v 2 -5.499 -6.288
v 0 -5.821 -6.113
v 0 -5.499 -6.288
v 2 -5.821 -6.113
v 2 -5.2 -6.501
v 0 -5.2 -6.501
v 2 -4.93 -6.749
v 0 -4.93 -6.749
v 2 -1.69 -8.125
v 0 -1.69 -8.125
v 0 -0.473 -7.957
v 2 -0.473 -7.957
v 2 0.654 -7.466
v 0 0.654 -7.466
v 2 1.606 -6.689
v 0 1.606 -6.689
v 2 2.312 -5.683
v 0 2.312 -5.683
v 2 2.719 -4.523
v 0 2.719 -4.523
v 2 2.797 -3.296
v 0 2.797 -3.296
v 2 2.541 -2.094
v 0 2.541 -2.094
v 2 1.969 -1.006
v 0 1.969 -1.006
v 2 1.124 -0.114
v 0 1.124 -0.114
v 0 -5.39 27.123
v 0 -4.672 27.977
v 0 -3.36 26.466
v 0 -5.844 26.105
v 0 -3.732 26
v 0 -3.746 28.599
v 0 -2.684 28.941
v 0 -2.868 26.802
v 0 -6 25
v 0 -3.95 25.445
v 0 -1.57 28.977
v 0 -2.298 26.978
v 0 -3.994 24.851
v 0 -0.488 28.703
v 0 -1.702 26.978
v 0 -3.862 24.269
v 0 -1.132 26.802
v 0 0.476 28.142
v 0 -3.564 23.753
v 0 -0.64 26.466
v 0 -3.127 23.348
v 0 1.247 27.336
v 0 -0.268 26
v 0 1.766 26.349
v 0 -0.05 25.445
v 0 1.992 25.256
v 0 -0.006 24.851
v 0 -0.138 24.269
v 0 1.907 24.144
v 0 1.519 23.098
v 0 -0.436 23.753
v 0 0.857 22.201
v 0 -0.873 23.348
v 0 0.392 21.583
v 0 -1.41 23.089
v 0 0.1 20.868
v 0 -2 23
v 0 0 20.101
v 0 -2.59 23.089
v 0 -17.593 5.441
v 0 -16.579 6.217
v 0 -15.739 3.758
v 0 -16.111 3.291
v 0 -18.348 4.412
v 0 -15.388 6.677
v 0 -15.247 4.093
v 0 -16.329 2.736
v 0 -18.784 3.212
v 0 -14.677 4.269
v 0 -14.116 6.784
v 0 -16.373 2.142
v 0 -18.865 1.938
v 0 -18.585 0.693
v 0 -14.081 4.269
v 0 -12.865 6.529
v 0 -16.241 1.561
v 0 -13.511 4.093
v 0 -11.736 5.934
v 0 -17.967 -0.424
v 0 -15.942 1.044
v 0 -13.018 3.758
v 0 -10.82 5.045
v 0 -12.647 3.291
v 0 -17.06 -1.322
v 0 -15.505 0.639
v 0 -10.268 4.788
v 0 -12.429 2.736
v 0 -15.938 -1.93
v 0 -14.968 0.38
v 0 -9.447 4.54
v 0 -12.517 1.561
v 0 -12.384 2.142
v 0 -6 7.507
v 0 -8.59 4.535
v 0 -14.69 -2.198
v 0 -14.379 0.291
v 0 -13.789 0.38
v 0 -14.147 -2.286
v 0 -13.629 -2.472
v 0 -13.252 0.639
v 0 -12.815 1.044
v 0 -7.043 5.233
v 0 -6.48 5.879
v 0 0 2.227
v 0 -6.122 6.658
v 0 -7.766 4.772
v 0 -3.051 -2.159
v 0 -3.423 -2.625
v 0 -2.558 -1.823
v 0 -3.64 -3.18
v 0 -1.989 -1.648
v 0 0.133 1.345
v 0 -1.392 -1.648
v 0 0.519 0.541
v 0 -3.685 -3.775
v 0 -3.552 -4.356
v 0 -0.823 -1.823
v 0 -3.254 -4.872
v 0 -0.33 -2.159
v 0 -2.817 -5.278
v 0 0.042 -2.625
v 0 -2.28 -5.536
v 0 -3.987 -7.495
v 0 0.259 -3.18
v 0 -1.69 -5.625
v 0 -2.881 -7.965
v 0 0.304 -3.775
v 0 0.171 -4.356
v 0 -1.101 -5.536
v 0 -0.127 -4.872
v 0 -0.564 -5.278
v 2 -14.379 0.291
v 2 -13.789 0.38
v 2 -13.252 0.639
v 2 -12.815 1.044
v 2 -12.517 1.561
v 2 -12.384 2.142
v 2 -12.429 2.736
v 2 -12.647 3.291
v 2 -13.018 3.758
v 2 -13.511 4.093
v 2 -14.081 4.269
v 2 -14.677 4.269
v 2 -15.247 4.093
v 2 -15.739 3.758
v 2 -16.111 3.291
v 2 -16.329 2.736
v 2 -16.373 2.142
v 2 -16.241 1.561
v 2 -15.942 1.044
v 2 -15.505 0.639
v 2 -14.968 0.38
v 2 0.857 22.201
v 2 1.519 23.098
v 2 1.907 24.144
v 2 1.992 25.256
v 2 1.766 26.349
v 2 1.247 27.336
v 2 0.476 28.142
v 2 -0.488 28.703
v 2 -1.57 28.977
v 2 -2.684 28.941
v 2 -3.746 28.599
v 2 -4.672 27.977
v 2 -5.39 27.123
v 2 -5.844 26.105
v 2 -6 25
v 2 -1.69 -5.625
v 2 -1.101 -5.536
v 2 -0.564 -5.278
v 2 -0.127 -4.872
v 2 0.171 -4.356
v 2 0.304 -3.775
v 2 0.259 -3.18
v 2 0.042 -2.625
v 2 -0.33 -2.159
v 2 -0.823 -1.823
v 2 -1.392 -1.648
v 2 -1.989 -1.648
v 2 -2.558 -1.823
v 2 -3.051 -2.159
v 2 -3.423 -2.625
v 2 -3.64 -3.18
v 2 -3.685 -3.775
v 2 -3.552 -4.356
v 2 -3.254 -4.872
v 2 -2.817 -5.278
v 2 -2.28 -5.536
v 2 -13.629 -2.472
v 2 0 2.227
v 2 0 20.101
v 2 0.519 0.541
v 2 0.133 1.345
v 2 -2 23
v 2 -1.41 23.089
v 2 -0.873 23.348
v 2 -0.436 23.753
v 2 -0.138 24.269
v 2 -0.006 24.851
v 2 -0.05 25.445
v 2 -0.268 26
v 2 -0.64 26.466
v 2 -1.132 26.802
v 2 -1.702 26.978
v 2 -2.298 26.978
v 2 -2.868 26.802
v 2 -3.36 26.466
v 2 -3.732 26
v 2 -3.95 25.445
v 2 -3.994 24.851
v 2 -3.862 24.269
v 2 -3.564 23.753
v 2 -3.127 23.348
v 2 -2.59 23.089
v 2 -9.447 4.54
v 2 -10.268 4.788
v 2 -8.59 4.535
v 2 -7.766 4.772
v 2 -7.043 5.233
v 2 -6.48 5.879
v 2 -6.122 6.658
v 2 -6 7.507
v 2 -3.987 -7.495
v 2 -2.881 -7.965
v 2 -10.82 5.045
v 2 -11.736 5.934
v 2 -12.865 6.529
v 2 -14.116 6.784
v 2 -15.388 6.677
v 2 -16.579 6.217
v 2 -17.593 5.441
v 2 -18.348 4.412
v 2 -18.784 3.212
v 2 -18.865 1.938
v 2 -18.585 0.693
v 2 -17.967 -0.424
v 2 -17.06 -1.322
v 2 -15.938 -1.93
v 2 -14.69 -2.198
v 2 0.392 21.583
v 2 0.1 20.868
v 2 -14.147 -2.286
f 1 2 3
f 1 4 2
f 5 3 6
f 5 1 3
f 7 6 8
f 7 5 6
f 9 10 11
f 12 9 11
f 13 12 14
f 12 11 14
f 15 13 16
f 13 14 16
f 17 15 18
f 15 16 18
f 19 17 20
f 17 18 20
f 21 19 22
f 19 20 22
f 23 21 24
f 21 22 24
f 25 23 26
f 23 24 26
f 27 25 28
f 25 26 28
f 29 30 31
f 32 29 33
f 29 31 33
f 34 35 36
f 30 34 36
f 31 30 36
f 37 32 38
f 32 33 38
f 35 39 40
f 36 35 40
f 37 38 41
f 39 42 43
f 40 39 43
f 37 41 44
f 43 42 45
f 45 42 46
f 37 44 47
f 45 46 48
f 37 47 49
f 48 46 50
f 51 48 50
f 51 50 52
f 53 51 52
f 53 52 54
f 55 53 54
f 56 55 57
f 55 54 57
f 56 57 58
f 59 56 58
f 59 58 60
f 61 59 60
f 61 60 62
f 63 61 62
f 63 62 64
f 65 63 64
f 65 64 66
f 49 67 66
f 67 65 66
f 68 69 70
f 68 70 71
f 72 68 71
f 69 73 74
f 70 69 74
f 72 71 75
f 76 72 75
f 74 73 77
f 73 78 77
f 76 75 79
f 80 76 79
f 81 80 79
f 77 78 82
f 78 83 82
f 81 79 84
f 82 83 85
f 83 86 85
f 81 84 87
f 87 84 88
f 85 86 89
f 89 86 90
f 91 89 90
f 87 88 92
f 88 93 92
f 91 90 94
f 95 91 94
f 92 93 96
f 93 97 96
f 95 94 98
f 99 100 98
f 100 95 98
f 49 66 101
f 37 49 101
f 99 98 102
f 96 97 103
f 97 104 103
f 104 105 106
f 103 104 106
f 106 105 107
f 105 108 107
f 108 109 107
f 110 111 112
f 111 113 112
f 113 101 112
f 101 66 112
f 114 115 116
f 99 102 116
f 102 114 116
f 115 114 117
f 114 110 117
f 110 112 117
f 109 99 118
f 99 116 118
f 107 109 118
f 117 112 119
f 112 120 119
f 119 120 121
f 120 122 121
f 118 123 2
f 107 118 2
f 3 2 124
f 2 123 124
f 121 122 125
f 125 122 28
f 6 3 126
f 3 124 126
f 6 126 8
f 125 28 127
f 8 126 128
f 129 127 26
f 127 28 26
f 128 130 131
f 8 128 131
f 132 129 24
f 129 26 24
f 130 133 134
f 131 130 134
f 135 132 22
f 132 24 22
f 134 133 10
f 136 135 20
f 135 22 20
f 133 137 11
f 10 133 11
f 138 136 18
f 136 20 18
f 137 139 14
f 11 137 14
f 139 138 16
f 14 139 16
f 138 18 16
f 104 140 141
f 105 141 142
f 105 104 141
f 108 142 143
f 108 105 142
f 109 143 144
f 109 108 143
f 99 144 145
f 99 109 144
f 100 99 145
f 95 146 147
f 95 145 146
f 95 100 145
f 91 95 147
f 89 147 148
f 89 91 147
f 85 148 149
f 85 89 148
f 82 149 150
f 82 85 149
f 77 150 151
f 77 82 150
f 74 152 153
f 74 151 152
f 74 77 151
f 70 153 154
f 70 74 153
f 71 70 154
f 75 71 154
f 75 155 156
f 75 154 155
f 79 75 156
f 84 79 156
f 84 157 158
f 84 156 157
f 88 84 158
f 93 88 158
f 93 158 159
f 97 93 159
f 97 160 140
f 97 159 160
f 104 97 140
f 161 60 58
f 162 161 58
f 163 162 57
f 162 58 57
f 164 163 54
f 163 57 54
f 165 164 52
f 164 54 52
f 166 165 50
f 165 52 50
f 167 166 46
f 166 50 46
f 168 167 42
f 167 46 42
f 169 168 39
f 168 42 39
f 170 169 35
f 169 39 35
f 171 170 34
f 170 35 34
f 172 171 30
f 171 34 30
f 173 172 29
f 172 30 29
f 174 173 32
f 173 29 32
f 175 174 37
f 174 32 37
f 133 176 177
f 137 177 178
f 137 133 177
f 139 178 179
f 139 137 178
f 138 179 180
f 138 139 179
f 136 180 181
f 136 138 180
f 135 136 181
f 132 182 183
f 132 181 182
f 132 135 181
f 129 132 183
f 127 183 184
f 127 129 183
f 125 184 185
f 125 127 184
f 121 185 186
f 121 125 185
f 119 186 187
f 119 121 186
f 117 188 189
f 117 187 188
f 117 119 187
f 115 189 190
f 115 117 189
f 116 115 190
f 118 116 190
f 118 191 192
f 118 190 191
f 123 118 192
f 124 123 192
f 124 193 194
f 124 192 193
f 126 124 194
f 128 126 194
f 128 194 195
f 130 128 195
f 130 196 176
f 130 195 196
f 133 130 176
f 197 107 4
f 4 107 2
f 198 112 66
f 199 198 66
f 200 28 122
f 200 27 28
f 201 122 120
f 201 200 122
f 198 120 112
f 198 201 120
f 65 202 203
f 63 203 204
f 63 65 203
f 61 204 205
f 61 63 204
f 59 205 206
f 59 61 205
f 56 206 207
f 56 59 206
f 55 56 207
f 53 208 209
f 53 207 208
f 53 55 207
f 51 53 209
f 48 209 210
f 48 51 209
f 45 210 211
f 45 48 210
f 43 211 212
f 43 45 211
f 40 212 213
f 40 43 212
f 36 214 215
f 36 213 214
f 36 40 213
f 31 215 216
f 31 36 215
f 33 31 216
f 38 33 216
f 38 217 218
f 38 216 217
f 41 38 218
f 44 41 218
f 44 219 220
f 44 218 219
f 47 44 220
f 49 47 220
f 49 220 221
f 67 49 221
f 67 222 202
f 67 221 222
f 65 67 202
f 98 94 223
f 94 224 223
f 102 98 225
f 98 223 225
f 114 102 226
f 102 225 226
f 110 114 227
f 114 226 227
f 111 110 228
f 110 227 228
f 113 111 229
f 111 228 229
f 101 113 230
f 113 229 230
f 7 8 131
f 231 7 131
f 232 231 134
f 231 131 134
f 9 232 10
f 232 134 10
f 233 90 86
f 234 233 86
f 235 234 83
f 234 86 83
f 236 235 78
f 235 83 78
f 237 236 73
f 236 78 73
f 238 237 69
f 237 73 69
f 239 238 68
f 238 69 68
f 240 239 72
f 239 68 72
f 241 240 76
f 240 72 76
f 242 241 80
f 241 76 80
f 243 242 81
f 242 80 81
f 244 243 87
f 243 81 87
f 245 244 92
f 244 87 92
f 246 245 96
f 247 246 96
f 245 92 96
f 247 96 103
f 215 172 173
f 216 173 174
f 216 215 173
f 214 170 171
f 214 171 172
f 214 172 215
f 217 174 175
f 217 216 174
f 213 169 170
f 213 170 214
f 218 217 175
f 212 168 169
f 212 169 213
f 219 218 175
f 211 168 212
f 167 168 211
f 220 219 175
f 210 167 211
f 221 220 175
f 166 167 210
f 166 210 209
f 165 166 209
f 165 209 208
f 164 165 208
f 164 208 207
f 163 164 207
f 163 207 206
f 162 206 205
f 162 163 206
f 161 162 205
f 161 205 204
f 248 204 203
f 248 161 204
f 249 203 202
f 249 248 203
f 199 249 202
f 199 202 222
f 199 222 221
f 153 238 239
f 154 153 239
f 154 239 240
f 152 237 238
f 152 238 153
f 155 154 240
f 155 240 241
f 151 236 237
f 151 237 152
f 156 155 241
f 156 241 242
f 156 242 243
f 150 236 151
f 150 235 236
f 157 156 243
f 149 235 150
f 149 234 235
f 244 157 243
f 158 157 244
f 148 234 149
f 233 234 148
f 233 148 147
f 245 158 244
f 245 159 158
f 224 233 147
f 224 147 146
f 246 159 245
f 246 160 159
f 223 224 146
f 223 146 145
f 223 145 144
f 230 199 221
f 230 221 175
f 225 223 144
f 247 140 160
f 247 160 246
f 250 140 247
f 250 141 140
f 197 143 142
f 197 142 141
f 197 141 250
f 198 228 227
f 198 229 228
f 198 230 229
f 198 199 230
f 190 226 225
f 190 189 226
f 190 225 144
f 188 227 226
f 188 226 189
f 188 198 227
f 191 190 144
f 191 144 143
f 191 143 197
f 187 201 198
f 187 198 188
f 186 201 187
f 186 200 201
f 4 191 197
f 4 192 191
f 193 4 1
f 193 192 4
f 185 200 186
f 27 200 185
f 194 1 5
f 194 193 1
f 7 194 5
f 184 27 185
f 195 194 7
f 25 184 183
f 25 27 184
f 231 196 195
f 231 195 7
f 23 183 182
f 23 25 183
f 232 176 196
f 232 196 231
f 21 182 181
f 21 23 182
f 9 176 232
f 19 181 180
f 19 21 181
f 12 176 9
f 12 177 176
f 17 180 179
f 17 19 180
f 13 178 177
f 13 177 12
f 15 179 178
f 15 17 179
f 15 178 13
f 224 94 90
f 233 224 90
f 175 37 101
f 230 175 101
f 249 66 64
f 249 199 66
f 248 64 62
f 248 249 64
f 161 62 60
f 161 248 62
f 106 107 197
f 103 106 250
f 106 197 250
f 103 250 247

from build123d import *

# Parameters (mm, degrees)
EXTRUDE_1_DEPTH     = 2
SKETCH_1_3_R        = 2
CUT_EXTRUDE_1_DEPTH = 35.66133887
FILLET_1_R          = 3


with BuildPart() as part:
    # 草图1 → 凸台-拉伸1 (new body)
    with BuildSketch(Plane(origin=(0, 0, 0), x_dir=(0, 0, -1), z_dir=(1, 0, 0))):
        with BuildLine():
            Line((-25, -6), (-25, 0))
            Line((-25, 0), (-21.535898385, 0))
            ThreePointArc((-21.535898385, 0), (-28.464101615, 0), (-25, -6))
        make_face()
        with BuildLine():
            Line((-21.535898385, 0), (-25, 0))
            Line((-25, 0), (-25, -6))
            ThreePointArc((-25, -6), (-22.171572875, -4.828427125), (-21, -2))
            ThreePointArc((-21, -2), (-21.136296695, -0.96472382), (-21.535898385, 0))
        make_face()
        with BuildLine():
            Line((-0.545176611, 0), (-21.535898385, 0))
            ThreePointArc((-21.535898385, 0), (-21.136296695, -0.96472382), (-21, -2))
            ThreePointArc((-21, -2), (-22.171572875, -4.828427125), (-25, -6))
            Line((-25, -6), (-2.797845949, -6))
            Line((-2.797845949, -6), (-0.871249866, -1.868401368))
            ThreePointArc((-0.871249866, -1.868401368), (-0.807766841, -0.916826597), (-0.545176611, 0))
        make_face()
        with BuildLine():
            ThreePointArc((8.125231148, -1.690473047), (4.486383017, 2.726360373), (-0.545176611, 0))
            Line((-0.545176611, 0), (0, 0))
            Line((0, 0), (7.250462296, -3.380946094))
            Line((7.250462296, -3.380946094), (6.37921243, -5.249347462))
            ThreePointArc((6.37921243, -5.249347462), (7.66521356, -3.67252807), (8.125231148, -1.690473047))
        make_face()
        with BuildLine():
            Line((0, 0), (-0.545176611, 0))
            ThreePointArc((-0.545176611, 0), (-0.807766841, -0.916826597), (-0.871249866, -1.868401368))
            Line((-0.871249866, -1.868401368), (0, 0))
        make_face()
        with BuildLine():
            Line((-0.871249866, -1.868401368), (-2.797845949, -6))
            Line((-2.797845949, -6), (0, -6))
            Line((0, -6), (0, -4.356499889))
            ThreePointArc((0, -4.356499889), (-0.621910323, -3.177681615), (-0.871249866, -1.868401368))
        make_face()
        with BuildLine():
            Line((0, -6), (-2.797845949, -6))
            Line((-2.797845949, -6), (-5.045405798, -10.819907651))
            ThreePointArc((-5.045405798, -10.819907651), (-0.389642338, -10.300397024), (2.205056498, -14.200853745))
            Line((2.205056498, -14.200853745), (6.37921243, -5.249347462))
            ThreePointArc((6.37921243, -5.249347462), (3.001481776, -6.147034134), (0, -4.356499889))
            Line((0, -4.356499889), (0, -6))
        make_face()
        with BuildLine():
            Line((7.250462296, -3.380946094), (0, 0))
            Line((0, 0), (0, -4.356499889))
            ThreePointArc((0, -4.356499889), (3.001481776, -6.147034134), (6.37921243, -5.249347462))
            Line((6.37921243, -5.249347462), (7.250462296, -3.380946094))
        make_face()
        with BuildLine():
            Line((0, -4.356499889), (0, 0))
            Line((0, 0), (-0.871249866, -1.868401368))
            ThreePointArc((-0.871249866, -1.868401368), (-0.621910323, -3.177681615), (0, -4.356499889))
        make_face()
        with BuildLine():
            ThreePointArc((2.205056498, -14.200853745), (-0.389642338, -10.300397024), (-5.045405798, -10.819907651))
            Line((-5.045405798, -10.819907651), (-5.916655664, -12.688309019))
            Line((-5.916655664, -12.688309019), (1.333806632, -16.069255112))
            Line((1.333806632, -16.069255112), (2.205056498, -14.200853745))
        make_face()
        with BuildLine():
            Line((-5.916655664, -12.688309019), (-5.045405798, -10.819907651))
            ThreePointArc((-5.045405798, -10.819907651), (-4.27347954, -18.418764477), (2.208575484, -14.378782065))
            ThreePointArc((2.208575484, -14.378782065), (2.207695651, -14.289800508), (2.205056498, -14.200853745))
            Line((2.205056498, -14.200853745), (1.333806632, -16.069255112))
            Line((1.333806632, -16.069255112), (-5.916655664, -12.688309019))
        make_face()
    extrude(amount=EXTRUDE_1_DEPTH)

    # 草图1<3> → 切除-拉伸1 (cut, through all)
    with BuildSketch(Plane(origin=(0, 0, 0), x_dir=(0, 0, -1), z_dir=(1, 0, 0))):
        with Locations((-25, -2)):
            Circle(SKETCH_1_3_R)
        with Locations((3.625231148, -1.690473047)):
            Circle(SKETCH_1_3_R)
        with Locations((-2.291424516, -14.378782065)):
            Circle(SKETCH_1_3_R)
    extrude(amount=CUT_EXTRUDE_1_DEPTH, mode=Mode.SUBTRACT)

    # 圆角1
    fillet_1_edges = [part.edges().sort_by_distance(p)[0] for p in [
        (1, -6, 2.797845949),
        (1, 0, 0.545176611),
        (1, -5.249347462, -6.37921243),
        (1, -14.200853745, -2.205056498),
        (1, 0, 21.535898385),
    ]]
    fillet(fillet_1_edges, radius=FILLET_1_R)


solid = part.part
